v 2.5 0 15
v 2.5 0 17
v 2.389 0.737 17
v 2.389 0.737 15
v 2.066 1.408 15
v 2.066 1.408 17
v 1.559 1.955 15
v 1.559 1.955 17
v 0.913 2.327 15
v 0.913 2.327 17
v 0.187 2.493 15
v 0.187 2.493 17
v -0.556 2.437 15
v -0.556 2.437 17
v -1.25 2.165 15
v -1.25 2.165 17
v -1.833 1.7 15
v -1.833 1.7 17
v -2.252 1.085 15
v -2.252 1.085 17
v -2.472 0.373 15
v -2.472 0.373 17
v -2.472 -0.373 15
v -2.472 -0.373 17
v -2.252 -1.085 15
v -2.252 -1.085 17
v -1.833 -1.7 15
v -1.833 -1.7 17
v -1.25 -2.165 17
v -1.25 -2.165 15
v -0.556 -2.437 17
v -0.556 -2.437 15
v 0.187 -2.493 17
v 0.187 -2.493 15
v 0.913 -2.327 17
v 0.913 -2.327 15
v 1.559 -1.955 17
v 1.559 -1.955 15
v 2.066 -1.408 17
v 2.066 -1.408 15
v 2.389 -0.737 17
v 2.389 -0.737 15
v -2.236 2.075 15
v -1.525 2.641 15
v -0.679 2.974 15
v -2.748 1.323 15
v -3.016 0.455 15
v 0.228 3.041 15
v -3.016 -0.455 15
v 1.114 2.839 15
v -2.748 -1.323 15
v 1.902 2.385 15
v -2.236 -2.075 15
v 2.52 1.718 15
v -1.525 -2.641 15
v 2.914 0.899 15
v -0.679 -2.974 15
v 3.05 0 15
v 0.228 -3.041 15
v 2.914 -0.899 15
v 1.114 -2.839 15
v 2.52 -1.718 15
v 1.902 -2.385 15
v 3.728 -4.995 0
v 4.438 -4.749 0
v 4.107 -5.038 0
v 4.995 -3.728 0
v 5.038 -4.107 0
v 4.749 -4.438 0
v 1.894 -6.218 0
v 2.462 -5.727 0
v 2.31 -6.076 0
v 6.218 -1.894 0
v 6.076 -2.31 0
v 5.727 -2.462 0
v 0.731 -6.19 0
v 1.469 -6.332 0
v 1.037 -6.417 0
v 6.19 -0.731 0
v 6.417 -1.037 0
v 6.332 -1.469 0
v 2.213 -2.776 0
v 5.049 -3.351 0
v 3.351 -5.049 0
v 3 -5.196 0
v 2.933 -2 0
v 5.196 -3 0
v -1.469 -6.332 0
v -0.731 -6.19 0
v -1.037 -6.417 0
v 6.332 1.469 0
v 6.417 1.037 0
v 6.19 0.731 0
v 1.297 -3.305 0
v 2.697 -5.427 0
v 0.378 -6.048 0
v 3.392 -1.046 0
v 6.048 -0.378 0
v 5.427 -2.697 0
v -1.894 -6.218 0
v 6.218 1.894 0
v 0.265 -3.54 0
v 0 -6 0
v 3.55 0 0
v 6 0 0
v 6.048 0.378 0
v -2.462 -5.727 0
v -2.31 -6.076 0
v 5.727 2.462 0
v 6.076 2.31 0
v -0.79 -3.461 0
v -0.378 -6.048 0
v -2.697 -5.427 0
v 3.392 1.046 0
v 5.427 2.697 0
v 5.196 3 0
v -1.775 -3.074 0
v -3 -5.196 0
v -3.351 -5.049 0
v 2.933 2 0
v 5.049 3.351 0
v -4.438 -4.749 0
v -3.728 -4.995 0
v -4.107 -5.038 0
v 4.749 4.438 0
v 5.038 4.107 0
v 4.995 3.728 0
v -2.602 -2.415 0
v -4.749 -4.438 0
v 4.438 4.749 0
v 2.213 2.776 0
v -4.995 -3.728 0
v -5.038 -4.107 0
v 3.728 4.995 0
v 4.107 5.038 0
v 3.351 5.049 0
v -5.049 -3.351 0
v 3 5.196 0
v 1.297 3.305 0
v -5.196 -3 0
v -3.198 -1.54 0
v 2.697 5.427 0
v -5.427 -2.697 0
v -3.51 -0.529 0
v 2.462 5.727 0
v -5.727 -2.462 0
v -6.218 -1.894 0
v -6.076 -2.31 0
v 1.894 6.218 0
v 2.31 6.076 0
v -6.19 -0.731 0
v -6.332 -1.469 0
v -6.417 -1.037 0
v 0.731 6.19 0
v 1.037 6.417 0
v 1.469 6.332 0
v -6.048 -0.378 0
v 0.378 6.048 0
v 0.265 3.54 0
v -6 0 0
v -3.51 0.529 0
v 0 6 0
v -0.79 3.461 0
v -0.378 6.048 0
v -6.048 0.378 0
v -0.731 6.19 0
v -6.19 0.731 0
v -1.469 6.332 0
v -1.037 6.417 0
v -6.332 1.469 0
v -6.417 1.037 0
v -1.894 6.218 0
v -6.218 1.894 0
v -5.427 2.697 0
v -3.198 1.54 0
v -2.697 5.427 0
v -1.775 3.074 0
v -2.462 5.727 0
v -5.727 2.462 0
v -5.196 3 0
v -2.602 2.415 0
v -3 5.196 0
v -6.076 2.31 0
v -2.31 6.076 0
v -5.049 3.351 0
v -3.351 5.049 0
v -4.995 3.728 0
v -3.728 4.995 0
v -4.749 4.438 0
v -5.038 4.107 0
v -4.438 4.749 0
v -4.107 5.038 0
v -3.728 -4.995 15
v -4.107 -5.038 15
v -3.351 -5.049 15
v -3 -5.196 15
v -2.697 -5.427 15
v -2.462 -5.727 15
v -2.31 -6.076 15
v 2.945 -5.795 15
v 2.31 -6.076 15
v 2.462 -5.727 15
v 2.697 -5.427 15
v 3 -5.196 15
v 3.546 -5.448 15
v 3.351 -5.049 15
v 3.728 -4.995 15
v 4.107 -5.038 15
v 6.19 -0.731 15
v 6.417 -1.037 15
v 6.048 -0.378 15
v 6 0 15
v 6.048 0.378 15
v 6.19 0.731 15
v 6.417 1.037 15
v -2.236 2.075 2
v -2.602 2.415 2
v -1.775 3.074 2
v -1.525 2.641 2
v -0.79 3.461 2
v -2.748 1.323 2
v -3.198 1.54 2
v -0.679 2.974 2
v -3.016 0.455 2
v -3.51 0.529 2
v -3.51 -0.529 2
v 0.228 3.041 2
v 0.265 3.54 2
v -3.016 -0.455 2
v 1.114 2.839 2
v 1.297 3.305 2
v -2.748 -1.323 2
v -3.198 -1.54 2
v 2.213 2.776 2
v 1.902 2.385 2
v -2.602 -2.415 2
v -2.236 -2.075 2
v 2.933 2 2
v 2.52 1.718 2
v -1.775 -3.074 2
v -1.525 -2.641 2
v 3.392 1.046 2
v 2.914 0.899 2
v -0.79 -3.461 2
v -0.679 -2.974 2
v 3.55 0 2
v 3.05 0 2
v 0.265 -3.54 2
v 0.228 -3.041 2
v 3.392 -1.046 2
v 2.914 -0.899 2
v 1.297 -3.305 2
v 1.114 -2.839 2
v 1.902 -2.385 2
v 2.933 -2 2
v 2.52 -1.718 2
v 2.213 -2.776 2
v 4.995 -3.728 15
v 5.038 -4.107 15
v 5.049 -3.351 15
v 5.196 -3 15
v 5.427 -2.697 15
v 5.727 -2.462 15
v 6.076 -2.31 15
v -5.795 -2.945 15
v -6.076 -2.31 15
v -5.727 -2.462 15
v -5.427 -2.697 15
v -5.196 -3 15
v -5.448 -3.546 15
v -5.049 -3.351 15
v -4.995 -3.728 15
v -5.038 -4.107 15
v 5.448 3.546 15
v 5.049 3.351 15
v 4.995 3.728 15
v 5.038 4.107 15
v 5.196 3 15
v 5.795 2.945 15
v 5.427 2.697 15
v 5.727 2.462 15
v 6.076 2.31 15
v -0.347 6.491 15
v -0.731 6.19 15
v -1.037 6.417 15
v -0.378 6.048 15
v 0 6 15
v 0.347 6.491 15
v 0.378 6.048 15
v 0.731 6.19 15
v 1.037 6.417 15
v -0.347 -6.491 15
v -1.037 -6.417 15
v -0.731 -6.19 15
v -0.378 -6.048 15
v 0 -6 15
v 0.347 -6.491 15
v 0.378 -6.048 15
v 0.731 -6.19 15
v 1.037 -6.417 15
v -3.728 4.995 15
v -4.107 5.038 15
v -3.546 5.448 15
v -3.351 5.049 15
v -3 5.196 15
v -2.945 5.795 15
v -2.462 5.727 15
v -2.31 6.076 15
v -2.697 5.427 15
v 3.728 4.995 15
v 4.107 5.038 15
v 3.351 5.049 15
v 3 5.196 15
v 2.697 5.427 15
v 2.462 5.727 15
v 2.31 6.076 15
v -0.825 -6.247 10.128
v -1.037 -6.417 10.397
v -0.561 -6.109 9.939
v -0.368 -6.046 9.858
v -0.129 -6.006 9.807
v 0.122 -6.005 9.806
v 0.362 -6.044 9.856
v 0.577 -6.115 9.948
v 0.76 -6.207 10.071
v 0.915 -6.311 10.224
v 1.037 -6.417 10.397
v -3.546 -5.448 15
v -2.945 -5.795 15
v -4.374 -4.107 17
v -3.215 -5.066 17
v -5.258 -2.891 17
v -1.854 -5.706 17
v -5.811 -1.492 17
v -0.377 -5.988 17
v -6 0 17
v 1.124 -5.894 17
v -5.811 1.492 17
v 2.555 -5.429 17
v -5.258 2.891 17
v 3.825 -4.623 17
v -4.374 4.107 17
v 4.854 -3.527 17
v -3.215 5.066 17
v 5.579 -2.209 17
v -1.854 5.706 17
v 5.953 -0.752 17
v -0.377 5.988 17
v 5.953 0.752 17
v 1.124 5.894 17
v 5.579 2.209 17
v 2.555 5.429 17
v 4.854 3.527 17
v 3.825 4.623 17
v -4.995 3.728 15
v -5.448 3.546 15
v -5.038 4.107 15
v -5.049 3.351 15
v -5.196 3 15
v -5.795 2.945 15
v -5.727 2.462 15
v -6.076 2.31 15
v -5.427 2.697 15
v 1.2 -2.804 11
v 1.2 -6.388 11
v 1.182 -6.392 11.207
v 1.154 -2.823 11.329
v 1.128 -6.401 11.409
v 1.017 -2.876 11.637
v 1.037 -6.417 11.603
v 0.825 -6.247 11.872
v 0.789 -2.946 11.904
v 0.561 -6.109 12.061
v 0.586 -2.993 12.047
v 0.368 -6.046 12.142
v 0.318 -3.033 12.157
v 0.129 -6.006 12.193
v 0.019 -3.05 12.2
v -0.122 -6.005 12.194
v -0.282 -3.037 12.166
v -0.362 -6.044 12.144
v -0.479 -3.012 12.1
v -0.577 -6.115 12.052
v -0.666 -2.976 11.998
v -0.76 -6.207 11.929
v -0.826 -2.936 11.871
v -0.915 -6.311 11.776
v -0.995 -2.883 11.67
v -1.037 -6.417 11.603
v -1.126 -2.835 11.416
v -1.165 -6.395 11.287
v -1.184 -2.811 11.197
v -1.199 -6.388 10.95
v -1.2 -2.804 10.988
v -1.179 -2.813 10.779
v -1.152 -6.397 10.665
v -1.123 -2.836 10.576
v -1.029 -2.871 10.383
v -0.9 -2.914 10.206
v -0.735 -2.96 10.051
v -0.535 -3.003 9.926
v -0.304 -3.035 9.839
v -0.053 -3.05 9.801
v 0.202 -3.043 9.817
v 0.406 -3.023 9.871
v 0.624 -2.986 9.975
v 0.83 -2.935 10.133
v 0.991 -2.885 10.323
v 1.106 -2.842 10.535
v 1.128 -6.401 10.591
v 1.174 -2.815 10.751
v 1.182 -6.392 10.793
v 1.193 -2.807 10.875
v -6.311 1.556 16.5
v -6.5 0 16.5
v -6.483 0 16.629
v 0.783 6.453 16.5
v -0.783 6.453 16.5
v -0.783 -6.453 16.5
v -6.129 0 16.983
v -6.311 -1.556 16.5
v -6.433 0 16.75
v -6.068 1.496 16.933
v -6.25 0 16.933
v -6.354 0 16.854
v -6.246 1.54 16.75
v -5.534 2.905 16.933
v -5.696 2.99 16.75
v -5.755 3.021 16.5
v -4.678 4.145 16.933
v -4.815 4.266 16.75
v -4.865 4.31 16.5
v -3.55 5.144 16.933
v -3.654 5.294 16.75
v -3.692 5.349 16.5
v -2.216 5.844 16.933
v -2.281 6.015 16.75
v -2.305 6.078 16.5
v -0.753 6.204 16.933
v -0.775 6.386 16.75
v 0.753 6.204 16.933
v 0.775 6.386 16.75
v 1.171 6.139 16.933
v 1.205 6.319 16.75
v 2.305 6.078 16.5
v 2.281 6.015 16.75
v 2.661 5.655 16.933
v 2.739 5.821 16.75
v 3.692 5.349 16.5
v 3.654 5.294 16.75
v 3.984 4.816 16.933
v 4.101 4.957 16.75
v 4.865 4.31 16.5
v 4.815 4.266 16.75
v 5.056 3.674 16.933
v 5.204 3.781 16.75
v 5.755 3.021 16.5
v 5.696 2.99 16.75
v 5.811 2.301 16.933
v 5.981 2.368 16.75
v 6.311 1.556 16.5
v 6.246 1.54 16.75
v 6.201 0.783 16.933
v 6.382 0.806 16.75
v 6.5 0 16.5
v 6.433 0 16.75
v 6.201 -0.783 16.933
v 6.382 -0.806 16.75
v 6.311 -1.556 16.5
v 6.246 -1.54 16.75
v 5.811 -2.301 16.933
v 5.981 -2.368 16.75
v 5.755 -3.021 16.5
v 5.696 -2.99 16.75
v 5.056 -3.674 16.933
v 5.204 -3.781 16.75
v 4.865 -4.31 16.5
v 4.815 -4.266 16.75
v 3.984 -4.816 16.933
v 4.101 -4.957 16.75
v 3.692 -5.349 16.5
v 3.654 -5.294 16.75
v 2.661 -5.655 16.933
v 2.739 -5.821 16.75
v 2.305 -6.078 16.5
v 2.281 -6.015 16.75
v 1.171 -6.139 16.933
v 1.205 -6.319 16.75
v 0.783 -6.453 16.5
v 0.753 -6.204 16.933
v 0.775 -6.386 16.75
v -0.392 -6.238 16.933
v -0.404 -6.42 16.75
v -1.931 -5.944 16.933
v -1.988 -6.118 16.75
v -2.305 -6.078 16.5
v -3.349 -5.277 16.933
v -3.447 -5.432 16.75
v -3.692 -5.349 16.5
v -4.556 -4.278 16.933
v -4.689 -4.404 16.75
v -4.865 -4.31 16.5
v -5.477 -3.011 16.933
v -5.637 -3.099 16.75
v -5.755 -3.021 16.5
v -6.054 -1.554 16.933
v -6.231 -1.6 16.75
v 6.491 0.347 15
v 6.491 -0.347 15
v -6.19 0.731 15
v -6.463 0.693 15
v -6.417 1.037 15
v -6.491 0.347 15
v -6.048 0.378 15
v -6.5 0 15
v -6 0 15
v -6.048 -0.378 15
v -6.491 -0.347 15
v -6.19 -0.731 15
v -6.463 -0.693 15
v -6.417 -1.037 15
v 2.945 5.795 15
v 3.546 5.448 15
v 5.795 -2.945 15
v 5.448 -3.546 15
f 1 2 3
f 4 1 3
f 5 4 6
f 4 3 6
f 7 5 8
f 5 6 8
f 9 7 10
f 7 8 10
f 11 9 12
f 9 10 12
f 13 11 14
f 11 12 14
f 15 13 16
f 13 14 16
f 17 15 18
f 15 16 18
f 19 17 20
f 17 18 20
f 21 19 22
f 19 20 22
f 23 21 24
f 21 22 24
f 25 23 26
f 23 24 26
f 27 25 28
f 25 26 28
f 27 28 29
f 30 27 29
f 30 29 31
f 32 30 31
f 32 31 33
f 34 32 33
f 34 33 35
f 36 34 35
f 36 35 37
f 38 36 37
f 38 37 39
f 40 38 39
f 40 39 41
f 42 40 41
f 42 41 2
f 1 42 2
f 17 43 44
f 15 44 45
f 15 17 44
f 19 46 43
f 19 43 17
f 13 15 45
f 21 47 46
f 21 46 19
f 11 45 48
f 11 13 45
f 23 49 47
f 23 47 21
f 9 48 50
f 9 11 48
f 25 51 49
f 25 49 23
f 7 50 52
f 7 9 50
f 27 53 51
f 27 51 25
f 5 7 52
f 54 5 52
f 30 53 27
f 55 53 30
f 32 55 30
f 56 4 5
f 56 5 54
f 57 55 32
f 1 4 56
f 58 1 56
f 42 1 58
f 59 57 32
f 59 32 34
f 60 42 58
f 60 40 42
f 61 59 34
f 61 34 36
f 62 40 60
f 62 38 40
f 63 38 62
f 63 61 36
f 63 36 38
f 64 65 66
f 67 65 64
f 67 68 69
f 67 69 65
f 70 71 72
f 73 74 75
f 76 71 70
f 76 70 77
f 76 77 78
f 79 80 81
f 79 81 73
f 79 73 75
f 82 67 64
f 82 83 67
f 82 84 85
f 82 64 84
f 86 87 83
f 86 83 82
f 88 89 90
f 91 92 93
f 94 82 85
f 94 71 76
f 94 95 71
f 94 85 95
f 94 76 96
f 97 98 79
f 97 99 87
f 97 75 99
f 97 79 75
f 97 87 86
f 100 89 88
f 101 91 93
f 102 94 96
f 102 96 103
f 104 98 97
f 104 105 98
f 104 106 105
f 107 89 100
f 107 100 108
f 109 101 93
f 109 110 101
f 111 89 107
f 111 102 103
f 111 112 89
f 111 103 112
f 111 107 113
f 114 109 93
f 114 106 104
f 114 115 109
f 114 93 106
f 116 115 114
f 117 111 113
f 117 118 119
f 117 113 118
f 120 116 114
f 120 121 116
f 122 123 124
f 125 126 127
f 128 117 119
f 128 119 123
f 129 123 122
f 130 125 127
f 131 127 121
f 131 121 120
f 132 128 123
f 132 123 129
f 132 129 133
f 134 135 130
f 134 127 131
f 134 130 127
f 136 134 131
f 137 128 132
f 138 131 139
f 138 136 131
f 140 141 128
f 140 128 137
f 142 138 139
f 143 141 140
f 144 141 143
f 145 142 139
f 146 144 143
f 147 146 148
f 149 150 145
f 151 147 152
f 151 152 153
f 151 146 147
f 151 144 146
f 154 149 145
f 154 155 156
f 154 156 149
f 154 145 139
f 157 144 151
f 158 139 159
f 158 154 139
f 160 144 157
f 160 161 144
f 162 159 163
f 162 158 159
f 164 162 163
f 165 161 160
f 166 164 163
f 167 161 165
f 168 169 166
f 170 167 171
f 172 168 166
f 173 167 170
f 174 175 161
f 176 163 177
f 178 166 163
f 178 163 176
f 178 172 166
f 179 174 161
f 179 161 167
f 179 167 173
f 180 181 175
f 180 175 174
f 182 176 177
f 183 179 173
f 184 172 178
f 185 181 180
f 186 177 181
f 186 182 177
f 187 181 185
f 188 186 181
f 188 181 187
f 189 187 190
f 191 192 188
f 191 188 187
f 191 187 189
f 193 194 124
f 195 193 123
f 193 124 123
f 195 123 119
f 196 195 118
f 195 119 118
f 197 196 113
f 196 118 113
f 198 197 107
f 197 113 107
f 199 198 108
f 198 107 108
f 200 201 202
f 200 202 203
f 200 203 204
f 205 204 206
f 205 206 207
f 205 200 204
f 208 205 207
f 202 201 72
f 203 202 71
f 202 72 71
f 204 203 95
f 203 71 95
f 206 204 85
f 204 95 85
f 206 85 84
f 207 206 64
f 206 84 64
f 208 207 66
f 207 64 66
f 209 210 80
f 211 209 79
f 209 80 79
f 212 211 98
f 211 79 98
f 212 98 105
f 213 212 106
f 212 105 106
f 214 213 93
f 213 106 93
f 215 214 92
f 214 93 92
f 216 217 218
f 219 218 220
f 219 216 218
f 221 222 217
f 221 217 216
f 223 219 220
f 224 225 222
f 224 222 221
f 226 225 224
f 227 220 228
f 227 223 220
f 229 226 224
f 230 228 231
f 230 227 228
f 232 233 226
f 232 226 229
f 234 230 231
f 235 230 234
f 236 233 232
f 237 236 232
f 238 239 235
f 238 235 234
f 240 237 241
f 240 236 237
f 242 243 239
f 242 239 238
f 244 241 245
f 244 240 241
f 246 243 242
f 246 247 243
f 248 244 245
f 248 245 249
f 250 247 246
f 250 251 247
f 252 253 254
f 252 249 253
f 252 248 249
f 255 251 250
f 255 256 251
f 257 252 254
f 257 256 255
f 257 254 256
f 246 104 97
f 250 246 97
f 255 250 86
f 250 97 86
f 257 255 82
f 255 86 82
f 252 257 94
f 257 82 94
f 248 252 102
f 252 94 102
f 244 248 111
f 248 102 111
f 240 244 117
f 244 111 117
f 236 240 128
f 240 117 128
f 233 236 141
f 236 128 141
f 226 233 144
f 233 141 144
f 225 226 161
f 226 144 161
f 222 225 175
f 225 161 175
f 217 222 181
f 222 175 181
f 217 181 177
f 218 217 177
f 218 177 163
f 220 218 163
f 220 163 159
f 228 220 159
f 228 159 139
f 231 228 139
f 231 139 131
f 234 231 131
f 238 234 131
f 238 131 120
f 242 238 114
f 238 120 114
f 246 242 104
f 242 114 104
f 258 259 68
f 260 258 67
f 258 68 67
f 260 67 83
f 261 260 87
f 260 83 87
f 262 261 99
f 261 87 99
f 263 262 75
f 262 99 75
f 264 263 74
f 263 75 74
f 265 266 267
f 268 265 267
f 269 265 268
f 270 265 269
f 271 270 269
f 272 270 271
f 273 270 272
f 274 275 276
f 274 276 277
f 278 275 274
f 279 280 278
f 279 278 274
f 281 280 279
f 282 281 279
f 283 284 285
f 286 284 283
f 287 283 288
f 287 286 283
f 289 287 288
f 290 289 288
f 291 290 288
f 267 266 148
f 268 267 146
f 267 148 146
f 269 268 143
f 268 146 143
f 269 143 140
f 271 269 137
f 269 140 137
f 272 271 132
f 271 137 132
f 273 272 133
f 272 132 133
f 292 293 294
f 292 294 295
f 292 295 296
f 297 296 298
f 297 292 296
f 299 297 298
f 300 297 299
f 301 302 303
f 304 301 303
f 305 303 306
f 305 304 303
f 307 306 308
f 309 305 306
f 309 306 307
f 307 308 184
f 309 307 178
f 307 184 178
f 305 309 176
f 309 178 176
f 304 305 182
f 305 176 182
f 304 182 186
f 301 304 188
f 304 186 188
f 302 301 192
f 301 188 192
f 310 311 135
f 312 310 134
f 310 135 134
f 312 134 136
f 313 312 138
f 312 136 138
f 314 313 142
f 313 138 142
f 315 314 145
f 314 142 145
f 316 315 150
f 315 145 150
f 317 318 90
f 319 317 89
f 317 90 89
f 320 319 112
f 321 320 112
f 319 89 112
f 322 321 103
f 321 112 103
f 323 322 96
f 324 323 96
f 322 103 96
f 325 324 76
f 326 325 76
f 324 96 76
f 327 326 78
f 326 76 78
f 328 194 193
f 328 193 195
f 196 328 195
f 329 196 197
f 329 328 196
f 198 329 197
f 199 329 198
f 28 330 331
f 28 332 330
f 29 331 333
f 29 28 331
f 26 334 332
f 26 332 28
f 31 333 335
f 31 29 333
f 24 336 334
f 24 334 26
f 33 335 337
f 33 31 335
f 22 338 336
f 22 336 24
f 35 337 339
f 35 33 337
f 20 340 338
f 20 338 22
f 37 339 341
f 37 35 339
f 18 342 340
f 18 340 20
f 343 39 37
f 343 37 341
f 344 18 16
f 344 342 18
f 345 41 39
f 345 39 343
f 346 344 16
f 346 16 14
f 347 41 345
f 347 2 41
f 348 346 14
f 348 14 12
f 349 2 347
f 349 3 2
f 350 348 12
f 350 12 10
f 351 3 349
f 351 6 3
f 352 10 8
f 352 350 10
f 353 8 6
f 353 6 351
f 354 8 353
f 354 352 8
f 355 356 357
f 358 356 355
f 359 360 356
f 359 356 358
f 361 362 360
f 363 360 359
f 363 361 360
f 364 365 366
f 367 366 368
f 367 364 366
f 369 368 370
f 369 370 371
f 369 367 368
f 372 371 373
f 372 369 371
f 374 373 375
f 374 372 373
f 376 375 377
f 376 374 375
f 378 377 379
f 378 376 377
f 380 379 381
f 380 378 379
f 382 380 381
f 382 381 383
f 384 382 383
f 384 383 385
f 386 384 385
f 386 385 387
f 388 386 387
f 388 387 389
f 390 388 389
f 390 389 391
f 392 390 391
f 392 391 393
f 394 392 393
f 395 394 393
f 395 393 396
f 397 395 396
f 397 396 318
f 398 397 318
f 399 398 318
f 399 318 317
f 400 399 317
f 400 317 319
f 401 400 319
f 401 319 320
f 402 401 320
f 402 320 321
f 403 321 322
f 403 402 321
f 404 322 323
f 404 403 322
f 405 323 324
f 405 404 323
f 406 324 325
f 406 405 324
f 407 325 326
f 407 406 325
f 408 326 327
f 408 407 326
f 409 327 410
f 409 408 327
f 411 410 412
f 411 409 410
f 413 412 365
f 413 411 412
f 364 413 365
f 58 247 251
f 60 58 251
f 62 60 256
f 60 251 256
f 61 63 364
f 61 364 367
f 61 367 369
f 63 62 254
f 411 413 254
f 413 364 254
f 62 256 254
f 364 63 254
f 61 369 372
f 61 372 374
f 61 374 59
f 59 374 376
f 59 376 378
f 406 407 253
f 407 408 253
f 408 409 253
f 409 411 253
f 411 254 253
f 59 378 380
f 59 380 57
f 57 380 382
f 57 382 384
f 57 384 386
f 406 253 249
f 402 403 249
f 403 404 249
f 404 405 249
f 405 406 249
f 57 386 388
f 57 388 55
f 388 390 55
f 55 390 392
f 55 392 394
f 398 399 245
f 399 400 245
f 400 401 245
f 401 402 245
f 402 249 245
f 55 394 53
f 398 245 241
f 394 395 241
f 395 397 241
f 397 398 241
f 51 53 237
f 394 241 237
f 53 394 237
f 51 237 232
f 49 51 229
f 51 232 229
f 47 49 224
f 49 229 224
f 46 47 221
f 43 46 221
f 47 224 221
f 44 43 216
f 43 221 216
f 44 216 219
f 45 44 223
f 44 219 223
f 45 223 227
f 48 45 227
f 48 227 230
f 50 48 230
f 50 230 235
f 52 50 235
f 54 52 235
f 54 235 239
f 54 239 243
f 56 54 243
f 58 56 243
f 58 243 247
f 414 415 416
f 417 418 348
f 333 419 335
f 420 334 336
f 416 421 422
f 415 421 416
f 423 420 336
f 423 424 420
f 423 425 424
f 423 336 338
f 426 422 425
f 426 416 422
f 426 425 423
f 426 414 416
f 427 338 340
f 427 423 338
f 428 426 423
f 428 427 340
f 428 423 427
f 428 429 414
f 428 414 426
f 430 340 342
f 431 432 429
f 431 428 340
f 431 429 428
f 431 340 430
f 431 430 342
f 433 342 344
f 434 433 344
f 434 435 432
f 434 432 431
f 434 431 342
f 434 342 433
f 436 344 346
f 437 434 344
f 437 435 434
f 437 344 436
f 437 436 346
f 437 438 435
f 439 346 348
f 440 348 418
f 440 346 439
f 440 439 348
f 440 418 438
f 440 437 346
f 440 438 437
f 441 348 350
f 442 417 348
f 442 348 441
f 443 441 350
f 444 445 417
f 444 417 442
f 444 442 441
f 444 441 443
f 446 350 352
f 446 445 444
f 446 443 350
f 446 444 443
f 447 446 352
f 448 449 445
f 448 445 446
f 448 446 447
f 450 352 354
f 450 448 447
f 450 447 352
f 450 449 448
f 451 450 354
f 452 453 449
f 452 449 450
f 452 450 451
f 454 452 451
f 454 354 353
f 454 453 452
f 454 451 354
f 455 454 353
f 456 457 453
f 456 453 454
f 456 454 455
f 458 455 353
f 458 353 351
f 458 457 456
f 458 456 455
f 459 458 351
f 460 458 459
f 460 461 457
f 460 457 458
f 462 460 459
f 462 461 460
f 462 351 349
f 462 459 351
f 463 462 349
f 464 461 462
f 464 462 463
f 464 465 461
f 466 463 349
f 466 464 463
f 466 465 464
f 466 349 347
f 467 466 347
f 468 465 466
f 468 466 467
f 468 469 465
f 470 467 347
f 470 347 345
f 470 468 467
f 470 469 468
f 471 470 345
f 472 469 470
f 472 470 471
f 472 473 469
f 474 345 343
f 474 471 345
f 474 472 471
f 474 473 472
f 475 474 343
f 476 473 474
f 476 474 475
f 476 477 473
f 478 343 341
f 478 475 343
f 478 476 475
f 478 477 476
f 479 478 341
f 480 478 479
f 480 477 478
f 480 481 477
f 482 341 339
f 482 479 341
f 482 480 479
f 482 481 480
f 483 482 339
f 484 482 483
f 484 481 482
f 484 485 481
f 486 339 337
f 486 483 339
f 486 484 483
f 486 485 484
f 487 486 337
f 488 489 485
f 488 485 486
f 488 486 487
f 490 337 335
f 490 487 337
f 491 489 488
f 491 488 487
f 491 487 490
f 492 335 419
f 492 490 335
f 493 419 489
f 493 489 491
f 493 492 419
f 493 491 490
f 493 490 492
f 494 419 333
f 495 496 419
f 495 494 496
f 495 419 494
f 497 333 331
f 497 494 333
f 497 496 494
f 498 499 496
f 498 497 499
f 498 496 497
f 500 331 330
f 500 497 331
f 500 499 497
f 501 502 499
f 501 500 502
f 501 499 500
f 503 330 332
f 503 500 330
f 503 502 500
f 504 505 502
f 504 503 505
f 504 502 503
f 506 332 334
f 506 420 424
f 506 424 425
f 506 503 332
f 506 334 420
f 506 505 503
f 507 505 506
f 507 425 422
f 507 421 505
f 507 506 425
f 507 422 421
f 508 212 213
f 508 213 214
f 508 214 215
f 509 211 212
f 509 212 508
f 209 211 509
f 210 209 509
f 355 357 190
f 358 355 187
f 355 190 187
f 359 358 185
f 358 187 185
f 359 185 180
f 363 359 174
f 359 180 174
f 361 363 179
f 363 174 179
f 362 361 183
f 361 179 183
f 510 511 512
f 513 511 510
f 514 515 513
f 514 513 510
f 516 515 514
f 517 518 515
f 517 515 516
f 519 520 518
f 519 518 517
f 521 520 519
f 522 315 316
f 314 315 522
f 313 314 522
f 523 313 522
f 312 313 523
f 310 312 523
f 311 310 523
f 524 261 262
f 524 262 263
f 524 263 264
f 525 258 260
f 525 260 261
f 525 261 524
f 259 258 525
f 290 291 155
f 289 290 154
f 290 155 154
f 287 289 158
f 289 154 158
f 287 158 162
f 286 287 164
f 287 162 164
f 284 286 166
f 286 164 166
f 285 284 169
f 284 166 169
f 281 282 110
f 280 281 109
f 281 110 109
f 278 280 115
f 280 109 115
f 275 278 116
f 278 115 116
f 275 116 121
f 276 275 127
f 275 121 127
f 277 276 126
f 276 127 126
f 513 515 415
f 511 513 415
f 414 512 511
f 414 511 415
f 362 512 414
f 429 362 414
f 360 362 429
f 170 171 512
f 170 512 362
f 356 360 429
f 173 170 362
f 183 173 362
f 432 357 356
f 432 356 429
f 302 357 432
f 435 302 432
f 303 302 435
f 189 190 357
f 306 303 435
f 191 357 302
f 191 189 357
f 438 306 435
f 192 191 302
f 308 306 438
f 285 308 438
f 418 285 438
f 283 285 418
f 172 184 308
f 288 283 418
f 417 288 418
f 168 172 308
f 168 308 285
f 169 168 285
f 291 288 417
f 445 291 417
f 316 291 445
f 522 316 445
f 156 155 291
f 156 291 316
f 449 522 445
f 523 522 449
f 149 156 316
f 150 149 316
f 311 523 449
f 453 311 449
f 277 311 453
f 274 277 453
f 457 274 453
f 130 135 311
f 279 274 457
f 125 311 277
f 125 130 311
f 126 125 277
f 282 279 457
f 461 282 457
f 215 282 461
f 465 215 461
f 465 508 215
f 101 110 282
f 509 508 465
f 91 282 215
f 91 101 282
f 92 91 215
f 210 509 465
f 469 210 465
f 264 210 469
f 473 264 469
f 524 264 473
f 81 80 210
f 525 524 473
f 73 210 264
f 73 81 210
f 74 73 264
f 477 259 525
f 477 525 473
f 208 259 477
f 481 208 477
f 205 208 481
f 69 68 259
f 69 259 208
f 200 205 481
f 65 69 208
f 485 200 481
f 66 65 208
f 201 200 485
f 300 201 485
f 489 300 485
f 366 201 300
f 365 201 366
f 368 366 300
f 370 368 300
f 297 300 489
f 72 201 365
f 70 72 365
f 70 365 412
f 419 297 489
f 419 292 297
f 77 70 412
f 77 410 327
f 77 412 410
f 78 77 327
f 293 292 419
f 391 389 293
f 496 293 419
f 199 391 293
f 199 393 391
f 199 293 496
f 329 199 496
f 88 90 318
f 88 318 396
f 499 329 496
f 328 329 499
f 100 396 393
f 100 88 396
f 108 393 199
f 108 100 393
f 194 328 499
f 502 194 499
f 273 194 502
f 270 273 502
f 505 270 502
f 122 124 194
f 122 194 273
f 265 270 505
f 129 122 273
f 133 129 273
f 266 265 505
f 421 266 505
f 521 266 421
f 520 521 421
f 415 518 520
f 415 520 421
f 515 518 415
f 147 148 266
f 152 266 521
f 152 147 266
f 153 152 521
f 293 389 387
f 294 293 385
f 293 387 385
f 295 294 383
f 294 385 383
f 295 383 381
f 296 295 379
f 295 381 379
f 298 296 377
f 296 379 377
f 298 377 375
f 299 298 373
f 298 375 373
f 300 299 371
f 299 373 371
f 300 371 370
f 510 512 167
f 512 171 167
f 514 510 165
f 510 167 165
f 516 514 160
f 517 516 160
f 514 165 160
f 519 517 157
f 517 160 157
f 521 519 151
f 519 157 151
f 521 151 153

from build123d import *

# Parameters (mm, degrees)
F2_R      = 3.05
F3_DEPTH  = 15
F4_R      = 0.5
F5_R      = 1.2
F6_DEPTH  = 7
F7_R      = 1.5
F8_DEPTH  = 15
F9_R      = 3.55
F10_DEPTH = 2
F11_R     = 2.5
F12_DEPTH = 3


with BuildPart() as f1:
    # F0 (on Front) → F1 (revolve)
    with BuildSketch(Plane.XZ):
        Polygon((-5, 0), (0, 0), (0, 17), (-6.5, 17), (-6.5, 0), align=None)
    revolve(axis=Axis((0, 0, -3.667768), (0, 0, -1)))

    # F2 (on face) → F3 (cut)
    with BuildSketch(Plane(origin=(0, 0, 0), x_dir=(1, 0, 0), z_dir=(0, 0, -1))):
        Circle(F2_R)
    extrude(amount=-F3_DEPTH, mode=Mode.SUBTRACT)

    # F4
    f4_edges = [f1.edges().sort_by_distance(p)[0] for p in [
        (6.5, 0, 17),
    ]]
    fillet(f4_edges, radius=F4_R)

    # F5 (on Front) → F6 (cut)
    with BuildSketch(Plane.XZ):
        with Locations((0, 11)):
            Circle(F5_R)
    extrude(amount=F6_DEPTH, mode=Mode.SUBTRACT)

    # F7 (on face) → F8 (cut)
    with BuildSketch(Plane(origin=(0, 0, 0), x_dir=(1, 0, 0), z_dir=(0, 0, -1))):
        with Locations((-7.5, 0)):
            Circle(F7_R)
        with Locations((-6.495191, -3.75)):
            Circle(F7_R)
        with Locations((-3.75, -6.495191)):
            Circle(F7_R)
        with Locations((0, -7.5)):
            Circle(F7_R)
        with Locations((3.75, -6.495191)):
            Circle(F7_R)
        with Locations((6.495191, -3.75)):
            Circle(F7_R)
        with Locations((7.5, 0)):
            Circle(F7_R)
        with Locations((6.495191, 3.75)):
            Circle(F7_R)
        with Locations((3.75, 6.495191)):
            Circle(F7_R)
        with Locations((0, 7.5)):
            Circle(F7_R)
        with Locations((-3.75, 6.495191)):
            Circle(F7_R)
        with Locations((-6.495191, 3.75)):
            Circle(F7_R)
    extrude(amount=-F8_DEPTH, mode=Mode.SUBTRACT)

    # F9 (on face) → F10 (cut)
    with BuildSketch(Plane(origin=(0, 0, 0), x_dir=(1, 0, 0), z_dir=(0, 0, -1))):
        Circle(F9_R)
    extrude(amount=-F10_DEPTH, mode=Mode.SUBTRACT)

    # F11 (on face) → F12 (cut)
    with BuildSketch(Plane.XY.offset(17)):
        Circle(F11_R)
    extrude(amount=-F12_DEPTH, mode=Mode.SUBTRACT)


solid = f1.part
